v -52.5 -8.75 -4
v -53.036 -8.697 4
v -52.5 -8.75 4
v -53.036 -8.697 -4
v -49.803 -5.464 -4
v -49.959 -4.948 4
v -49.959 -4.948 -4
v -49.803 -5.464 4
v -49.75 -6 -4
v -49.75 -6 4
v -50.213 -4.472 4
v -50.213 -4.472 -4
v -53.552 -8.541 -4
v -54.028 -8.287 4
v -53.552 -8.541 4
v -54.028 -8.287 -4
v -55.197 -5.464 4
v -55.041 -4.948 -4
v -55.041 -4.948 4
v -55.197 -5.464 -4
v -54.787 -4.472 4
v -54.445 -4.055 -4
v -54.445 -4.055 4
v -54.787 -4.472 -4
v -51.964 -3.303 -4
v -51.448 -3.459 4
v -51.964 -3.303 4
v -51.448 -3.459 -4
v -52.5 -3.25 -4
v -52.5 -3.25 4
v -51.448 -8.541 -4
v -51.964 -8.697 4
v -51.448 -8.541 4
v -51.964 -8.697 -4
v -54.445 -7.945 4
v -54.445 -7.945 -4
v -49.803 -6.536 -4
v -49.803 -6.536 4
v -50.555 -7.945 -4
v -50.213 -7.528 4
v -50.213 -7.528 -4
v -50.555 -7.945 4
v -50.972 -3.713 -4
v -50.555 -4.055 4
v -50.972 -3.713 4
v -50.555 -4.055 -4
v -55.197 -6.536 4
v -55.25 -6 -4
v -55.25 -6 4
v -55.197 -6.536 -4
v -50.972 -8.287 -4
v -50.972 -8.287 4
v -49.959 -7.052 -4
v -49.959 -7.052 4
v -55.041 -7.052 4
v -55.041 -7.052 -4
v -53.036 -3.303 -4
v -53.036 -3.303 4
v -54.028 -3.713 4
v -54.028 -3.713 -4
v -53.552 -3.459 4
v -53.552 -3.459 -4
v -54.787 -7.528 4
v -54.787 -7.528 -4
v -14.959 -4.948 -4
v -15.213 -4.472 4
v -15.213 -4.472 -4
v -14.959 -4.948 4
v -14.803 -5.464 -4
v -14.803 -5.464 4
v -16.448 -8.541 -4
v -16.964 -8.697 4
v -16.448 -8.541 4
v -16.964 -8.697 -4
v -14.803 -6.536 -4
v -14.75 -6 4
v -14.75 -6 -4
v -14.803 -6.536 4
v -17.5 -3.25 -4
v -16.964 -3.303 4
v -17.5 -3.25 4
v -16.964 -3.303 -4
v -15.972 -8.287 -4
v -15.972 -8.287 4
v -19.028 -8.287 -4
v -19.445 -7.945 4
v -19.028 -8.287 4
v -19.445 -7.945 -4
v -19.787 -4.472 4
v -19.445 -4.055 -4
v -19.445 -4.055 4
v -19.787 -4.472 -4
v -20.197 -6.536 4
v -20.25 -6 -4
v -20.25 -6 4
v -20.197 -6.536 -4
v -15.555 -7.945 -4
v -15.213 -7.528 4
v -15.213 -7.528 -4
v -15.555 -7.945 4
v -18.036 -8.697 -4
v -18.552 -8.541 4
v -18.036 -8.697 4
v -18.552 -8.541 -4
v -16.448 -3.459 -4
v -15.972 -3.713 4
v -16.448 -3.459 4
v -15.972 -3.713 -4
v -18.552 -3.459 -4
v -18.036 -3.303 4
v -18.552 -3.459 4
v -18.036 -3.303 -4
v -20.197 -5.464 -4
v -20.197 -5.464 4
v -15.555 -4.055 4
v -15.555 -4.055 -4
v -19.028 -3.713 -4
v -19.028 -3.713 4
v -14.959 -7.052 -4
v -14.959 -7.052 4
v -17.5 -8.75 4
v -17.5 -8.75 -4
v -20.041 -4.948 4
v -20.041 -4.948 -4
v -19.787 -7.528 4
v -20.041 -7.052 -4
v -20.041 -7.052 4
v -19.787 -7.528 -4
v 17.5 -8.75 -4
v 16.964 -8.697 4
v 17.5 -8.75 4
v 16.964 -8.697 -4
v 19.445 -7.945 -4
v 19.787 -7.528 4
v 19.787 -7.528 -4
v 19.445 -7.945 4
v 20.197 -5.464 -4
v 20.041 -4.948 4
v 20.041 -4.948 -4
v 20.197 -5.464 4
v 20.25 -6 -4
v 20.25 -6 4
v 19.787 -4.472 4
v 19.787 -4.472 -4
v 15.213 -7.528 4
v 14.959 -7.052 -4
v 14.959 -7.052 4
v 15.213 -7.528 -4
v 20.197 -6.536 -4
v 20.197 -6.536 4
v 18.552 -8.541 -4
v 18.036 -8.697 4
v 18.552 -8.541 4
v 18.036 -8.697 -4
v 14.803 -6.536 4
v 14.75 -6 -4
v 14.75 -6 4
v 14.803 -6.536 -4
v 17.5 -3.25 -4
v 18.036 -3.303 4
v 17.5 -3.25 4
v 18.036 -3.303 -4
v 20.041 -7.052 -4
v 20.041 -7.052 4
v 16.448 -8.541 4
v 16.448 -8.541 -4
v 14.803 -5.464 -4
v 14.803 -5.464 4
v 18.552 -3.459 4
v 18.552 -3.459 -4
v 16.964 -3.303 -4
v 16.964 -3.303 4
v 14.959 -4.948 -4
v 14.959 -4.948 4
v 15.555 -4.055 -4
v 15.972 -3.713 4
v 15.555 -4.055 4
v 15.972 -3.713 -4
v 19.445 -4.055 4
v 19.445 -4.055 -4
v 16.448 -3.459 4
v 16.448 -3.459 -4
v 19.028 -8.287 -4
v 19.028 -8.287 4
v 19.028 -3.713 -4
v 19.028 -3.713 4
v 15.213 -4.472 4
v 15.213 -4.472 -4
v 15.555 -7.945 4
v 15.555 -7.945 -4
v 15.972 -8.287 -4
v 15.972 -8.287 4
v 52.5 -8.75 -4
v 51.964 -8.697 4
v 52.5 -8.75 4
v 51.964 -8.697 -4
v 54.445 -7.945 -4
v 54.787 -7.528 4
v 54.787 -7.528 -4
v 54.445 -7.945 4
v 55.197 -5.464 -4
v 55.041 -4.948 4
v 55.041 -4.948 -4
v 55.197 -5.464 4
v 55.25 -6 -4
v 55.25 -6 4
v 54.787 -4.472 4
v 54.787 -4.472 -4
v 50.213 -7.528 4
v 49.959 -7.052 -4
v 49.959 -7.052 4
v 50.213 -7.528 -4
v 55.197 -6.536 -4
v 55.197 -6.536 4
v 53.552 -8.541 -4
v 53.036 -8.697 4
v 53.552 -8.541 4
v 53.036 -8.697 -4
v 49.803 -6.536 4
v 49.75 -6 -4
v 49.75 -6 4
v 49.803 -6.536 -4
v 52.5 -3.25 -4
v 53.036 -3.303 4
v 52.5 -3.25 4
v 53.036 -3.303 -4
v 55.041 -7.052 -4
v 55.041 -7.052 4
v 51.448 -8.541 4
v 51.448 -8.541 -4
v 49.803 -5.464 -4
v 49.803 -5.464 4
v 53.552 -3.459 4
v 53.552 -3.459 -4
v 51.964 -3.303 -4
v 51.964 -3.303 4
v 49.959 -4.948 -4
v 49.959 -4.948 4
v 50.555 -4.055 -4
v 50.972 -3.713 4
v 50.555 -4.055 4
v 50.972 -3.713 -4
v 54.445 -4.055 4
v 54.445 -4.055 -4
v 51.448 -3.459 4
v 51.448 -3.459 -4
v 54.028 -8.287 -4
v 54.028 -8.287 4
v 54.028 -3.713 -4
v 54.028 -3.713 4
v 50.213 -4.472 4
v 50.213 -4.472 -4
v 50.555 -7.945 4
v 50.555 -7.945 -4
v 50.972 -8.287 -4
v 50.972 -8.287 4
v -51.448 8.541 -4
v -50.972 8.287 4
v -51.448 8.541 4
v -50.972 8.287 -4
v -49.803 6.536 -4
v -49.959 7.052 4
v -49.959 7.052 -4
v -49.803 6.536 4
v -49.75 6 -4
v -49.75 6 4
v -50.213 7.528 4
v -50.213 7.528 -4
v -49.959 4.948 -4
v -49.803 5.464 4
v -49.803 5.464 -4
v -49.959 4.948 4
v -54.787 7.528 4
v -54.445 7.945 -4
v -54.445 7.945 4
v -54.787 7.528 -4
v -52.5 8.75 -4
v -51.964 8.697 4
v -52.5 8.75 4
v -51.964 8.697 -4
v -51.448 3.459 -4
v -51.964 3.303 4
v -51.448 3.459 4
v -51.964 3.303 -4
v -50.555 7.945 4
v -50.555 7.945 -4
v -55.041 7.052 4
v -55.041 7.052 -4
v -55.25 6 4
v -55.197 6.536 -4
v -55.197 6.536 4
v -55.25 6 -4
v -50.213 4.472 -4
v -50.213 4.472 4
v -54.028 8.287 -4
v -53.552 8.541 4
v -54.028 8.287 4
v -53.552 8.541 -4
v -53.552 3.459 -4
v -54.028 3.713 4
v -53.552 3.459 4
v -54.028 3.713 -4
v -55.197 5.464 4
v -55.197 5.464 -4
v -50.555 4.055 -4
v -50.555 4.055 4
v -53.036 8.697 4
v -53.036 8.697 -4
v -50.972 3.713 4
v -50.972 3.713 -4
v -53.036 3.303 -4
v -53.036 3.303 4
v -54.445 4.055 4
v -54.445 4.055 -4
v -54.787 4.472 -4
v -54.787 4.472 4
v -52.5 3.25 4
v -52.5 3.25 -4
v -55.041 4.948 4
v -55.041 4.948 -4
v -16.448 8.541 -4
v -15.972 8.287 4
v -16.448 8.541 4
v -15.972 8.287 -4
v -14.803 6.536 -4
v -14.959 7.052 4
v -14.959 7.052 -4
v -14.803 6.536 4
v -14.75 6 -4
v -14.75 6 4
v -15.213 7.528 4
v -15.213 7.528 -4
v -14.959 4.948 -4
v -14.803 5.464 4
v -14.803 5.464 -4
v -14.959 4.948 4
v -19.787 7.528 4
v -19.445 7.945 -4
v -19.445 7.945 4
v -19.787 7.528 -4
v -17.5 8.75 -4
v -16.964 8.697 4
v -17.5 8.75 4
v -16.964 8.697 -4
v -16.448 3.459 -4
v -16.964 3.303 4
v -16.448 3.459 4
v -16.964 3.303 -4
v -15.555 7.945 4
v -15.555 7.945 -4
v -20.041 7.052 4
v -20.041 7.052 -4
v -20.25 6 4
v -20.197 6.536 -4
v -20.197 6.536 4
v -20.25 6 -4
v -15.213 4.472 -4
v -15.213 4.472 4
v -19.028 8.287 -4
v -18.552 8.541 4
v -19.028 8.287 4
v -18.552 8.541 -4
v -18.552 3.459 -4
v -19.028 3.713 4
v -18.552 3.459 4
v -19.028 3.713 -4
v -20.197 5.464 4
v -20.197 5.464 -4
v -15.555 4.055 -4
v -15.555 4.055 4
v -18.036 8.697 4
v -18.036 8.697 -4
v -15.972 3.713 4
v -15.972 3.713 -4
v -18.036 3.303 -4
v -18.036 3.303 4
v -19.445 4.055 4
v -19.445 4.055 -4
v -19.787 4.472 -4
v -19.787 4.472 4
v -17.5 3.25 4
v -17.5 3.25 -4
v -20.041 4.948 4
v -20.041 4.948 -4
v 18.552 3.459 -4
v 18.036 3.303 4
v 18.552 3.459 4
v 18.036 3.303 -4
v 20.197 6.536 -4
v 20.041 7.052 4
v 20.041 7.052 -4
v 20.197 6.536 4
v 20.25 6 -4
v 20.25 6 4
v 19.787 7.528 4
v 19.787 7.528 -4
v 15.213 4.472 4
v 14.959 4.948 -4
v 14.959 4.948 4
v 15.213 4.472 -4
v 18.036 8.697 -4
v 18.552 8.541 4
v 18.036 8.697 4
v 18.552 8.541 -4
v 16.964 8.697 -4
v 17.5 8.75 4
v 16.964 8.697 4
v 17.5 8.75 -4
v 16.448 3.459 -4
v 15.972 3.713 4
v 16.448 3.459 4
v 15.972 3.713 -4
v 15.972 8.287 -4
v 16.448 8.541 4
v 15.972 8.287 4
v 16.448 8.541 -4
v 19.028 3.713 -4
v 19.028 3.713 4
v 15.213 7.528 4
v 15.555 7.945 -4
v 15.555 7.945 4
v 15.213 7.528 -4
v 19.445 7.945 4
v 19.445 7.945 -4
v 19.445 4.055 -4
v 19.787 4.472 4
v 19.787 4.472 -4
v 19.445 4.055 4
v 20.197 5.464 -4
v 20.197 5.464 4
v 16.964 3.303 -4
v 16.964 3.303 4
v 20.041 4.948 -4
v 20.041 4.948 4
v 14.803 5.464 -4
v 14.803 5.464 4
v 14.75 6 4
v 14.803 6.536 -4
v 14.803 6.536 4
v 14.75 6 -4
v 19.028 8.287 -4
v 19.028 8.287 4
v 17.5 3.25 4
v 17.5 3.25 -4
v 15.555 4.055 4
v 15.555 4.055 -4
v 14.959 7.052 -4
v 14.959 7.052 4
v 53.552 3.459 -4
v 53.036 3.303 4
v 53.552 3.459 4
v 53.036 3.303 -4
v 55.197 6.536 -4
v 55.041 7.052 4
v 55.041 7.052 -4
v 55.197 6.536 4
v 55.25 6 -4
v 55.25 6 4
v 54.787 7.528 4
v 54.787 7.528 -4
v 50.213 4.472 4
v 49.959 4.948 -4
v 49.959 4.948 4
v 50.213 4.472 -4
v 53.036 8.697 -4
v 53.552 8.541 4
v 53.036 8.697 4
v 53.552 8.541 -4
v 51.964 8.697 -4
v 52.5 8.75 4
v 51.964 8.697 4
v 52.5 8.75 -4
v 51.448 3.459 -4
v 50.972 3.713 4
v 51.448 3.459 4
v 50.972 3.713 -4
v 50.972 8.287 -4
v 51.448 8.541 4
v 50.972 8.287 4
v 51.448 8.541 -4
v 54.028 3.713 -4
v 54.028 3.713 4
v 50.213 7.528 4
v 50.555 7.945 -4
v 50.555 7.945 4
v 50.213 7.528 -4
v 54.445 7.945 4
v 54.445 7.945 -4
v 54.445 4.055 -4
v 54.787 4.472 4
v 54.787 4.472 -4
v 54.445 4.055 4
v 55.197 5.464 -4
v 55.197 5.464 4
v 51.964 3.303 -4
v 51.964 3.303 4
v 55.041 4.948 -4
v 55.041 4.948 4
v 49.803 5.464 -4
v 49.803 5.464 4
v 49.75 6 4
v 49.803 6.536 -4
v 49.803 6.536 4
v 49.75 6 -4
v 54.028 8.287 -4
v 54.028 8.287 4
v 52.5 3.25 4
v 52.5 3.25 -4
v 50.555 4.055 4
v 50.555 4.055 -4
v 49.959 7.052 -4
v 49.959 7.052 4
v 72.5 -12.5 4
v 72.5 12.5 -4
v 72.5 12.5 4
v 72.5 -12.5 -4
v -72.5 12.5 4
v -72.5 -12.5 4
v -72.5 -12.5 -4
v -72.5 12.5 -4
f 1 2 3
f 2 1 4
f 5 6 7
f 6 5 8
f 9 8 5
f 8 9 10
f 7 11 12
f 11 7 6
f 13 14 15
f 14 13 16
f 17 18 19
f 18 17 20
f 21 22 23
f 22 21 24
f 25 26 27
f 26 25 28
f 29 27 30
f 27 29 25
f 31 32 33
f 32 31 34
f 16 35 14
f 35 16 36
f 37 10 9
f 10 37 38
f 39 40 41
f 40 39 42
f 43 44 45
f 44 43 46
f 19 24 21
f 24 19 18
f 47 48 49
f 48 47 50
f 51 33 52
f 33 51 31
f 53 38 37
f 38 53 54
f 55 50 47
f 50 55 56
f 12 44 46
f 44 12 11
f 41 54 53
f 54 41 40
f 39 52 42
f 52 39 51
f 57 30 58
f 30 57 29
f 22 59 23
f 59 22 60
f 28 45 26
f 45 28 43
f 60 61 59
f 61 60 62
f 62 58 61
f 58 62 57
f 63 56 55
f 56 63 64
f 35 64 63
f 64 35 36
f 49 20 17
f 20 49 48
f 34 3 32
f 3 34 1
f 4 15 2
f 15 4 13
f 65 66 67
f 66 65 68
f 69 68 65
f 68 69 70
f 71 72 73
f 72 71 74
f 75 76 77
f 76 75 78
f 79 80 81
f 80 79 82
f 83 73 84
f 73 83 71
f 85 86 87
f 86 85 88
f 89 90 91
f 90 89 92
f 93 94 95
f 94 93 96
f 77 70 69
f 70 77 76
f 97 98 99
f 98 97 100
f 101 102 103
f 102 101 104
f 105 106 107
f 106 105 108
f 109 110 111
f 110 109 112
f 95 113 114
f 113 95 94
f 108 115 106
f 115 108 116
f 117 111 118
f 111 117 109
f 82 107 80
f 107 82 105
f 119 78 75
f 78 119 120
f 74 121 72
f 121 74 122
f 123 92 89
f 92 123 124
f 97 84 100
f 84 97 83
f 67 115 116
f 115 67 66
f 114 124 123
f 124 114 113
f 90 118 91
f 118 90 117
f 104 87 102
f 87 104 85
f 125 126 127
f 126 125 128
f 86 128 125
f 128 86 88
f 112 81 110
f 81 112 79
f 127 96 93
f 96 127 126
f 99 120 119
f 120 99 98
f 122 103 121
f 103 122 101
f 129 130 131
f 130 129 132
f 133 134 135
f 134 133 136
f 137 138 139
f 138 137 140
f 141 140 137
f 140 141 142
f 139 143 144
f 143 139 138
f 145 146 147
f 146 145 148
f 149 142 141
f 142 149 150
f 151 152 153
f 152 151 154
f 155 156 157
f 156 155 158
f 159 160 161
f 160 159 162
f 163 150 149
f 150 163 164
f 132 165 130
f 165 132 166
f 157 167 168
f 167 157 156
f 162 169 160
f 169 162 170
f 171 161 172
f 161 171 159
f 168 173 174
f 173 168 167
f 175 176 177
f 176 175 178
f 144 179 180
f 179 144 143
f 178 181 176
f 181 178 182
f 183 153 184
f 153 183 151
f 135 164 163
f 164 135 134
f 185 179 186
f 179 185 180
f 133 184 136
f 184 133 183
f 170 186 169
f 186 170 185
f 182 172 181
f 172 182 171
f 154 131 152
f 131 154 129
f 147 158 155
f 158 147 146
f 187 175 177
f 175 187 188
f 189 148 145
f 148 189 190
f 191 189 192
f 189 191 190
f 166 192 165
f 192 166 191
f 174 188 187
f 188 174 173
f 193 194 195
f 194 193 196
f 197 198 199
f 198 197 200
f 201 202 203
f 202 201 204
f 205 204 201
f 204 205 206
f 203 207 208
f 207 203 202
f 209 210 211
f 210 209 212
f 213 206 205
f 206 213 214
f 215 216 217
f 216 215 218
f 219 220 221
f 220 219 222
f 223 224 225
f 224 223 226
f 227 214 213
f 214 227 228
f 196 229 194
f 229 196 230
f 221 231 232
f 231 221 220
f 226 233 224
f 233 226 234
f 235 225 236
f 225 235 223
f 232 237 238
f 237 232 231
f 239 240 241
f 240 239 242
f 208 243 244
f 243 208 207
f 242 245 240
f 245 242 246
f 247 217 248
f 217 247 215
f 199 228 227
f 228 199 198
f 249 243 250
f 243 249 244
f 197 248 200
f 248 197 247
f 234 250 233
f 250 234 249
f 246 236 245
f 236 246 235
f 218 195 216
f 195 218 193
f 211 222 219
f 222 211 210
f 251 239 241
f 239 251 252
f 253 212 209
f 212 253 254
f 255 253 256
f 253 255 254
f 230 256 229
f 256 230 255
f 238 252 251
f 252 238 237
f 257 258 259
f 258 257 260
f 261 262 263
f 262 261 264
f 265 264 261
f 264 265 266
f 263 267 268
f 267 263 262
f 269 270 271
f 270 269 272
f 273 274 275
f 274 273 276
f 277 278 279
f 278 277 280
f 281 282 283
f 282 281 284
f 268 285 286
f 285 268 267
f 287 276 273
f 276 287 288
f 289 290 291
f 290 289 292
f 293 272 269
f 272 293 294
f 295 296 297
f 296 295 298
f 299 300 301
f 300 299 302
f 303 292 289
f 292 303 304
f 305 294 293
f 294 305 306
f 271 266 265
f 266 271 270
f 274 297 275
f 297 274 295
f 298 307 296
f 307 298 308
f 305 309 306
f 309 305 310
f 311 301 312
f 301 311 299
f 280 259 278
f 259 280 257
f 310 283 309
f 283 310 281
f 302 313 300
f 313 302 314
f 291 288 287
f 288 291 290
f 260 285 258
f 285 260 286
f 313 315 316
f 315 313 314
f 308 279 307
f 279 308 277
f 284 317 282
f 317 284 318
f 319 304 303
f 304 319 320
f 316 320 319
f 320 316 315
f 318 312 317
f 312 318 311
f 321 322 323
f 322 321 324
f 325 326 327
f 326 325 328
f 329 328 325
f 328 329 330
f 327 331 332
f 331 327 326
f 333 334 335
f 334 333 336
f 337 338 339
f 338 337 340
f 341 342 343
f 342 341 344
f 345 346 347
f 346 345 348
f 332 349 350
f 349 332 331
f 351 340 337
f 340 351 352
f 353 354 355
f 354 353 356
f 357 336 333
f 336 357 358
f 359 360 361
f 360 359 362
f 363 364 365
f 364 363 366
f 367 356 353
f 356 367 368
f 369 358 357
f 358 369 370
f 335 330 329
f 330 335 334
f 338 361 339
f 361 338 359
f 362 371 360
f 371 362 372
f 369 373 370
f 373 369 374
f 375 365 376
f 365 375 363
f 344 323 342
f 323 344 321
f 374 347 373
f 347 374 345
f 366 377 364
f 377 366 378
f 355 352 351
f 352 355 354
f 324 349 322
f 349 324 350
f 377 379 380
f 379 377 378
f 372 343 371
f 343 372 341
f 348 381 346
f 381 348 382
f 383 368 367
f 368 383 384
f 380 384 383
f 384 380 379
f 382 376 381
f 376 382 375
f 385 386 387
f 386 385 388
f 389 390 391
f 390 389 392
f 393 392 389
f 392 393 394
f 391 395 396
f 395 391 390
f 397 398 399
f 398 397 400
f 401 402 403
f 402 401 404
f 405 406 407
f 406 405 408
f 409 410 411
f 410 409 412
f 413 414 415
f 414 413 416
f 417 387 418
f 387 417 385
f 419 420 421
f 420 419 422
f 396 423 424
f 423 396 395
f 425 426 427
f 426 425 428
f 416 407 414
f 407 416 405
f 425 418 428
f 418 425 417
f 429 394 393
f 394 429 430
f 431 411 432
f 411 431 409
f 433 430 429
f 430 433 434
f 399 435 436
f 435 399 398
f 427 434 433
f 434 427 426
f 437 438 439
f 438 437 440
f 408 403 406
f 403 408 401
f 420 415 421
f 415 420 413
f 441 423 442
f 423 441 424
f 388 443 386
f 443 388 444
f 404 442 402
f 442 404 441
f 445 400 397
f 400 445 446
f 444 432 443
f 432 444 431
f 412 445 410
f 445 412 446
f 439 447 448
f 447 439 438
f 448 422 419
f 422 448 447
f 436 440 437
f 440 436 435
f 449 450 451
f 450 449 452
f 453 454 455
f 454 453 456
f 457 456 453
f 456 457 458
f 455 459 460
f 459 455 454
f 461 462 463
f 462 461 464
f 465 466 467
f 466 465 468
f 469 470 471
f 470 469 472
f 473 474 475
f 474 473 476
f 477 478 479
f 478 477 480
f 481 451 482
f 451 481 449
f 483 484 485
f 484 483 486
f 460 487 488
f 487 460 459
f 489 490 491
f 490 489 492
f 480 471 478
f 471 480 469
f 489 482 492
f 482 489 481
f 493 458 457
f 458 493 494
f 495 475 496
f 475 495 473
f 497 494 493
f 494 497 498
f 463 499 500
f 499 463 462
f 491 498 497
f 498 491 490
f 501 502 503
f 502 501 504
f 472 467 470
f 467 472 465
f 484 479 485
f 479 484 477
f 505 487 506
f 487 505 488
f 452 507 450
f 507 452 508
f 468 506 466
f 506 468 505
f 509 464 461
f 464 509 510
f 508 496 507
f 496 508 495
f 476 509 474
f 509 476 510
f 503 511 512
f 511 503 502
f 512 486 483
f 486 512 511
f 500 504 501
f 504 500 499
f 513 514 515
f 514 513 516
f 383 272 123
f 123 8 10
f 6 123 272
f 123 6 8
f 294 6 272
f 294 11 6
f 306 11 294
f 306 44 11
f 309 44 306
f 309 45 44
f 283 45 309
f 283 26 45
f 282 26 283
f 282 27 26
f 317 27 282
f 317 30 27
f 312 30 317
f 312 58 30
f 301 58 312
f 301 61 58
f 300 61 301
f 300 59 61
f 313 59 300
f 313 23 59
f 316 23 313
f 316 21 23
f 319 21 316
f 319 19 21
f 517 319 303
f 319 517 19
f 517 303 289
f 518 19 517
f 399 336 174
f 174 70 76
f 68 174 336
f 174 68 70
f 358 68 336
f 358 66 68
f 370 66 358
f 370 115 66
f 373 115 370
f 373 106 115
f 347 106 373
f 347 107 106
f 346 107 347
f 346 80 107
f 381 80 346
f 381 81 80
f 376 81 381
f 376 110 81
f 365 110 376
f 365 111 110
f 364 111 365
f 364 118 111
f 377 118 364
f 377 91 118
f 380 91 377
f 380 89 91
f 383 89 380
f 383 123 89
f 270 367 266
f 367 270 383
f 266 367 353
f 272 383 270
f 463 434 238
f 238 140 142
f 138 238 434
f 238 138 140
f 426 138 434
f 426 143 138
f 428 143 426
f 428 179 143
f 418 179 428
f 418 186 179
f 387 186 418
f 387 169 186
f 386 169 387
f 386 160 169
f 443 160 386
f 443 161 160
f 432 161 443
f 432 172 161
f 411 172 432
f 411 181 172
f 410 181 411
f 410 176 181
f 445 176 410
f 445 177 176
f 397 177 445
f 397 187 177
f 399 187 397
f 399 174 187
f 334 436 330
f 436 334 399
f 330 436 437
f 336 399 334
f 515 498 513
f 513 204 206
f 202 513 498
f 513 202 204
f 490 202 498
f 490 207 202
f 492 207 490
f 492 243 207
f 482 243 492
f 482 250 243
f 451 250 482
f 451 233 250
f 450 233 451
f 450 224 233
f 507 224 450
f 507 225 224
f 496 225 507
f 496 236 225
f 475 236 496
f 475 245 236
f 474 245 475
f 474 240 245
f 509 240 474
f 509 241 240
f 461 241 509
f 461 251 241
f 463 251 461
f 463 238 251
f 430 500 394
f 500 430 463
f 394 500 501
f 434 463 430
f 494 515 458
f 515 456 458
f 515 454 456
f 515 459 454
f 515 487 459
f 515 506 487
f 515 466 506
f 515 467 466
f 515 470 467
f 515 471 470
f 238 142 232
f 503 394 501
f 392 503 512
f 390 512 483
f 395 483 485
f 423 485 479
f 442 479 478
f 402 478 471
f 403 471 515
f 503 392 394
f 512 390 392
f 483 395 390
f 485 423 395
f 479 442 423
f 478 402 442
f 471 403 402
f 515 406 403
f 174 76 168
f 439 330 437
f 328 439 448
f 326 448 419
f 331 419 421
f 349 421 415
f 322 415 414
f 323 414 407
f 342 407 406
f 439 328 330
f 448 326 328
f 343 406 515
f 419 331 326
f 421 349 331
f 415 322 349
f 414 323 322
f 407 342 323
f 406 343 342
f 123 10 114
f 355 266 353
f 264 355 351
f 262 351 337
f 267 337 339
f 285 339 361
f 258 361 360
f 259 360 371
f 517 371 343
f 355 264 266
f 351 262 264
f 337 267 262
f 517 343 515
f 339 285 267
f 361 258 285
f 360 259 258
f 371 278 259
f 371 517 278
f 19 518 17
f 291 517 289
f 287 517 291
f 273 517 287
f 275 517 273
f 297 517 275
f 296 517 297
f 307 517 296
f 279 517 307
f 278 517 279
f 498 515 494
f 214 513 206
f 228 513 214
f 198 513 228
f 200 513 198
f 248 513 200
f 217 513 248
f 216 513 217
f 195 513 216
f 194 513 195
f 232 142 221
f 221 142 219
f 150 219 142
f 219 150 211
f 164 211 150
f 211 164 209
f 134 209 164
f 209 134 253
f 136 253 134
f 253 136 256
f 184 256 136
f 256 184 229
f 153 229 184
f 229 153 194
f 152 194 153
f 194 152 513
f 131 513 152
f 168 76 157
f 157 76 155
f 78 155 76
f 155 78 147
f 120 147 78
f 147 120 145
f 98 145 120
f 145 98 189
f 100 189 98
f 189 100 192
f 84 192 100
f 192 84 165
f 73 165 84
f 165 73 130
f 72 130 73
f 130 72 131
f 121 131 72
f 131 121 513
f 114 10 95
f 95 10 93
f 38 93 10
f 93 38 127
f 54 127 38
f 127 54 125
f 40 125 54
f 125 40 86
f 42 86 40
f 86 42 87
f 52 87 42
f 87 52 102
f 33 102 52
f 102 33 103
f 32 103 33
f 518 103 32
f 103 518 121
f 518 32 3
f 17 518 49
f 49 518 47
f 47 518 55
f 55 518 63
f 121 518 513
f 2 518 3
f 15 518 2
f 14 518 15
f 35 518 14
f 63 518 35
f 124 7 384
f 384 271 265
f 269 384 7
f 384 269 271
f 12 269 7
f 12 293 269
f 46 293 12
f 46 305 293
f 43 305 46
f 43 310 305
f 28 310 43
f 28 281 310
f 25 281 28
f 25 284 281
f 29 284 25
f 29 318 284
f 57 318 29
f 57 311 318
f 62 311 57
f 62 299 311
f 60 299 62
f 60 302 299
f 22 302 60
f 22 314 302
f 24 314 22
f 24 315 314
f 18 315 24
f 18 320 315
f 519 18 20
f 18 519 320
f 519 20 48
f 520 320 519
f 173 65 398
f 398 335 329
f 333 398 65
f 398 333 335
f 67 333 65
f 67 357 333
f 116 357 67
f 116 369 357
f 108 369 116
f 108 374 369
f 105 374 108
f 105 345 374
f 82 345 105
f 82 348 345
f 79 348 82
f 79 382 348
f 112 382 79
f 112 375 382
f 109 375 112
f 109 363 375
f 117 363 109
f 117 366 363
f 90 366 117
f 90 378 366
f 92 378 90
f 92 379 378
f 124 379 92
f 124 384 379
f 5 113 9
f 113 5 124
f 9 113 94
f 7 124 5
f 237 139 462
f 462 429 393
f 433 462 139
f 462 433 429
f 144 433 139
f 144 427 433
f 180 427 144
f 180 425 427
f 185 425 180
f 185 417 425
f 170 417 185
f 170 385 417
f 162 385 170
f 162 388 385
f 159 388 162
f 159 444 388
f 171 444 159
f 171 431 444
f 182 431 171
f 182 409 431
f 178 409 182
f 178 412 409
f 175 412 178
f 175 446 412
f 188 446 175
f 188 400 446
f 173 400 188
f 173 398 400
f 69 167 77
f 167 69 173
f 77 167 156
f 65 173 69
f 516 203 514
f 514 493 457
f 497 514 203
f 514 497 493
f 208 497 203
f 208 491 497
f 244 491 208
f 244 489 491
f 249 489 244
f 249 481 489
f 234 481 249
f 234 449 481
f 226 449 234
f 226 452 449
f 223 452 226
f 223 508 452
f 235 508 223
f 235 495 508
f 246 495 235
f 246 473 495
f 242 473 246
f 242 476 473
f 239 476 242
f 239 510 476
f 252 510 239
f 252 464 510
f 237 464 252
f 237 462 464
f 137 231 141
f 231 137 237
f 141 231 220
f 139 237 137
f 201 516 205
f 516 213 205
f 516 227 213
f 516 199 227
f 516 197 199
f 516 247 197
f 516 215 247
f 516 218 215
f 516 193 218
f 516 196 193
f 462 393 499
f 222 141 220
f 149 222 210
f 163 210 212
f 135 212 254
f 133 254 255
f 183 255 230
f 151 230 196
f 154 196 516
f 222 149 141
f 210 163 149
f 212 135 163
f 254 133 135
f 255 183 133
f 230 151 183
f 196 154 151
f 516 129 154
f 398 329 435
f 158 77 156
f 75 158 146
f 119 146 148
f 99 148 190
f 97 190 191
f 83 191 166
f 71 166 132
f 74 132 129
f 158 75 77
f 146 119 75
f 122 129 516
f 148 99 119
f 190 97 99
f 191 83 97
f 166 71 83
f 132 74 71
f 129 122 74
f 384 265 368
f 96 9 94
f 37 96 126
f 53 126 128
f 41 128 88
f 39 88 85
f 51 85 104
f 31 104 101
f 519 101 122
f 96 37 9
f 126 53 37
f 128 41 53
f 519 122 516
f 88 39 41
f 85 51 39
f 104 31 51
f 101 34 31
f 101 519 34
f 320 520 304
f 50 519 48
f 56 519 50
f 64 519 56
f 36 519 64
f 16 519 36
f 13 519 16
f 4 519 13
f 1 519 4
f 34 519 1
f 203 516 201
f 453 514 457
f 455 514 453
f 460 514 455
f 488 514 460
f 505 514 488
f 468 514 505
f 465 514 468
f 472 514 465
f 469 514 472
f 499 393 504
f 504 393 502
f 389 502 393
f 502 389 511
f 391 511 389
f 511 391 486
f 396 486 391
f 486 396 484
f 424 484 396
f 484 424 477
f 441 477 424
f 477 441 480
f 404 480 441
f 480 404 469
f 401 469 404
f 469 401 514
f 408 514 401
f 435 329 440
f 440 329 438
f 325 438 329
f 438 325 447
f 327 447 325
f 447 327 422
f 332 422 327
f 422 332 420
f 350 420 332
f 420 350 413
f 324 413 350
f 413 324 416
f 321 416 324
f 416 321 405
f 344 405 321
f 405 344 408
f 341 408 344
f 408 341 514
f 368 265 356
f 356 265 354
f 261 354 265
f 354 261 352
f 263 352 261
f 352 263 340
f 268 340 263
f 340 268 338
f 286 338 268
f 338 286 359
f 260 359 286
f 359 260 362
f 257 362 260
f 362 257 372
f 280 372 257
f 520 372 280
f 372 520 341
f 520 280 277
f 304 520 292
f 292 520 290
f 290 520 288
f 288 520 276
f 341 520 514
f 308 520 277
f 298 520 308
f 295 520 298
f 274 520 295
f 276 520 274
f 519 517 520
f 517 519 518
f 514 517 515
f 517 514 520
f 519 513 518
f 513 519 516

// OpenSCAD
$fn = 32;

// ----------------------------------------------------------------------
// Hole bar, 4 x Ø5.5
// tworows layout, 20 mm edge offset
// ----------------------------------------------------------------------

// --- parameters (mm) ---
bar_w = 25;       // bar width (Y)
bar_t = 8;        // bar thickness (Z)
holes = 4;        // holes per row
hole_d = 5.5;     // hole diameter
edge = 20;        // offset from the bar end to the first hole
pitch = 35;       // pitch between neighbouring holes
row_offset = 12;  // distance between the two rows

// --- derived feature positions (mm) ---
span = (holes - 1) * pitch;   // = 105   distance between the end holes
bar_l = span + 2 * edge;      // = 145   overall bar length
start_x = -bar_l / 2 + edge;  // = -52.5   X of the first hole
feature_centers = [
  [start_x + 0 * pitch, -row_offset / 2],
  [start_x + 1 * pitch, -row_offset / 2],
  [start_x + 2 * pitch, -row_offset / 2],
  [start_x + 3 * pitch, -row_offset / 2]
];   // hole centres of the first row
row2_centers = [
  [start_x + 0 * pitch, row_offset / 2],
  [start_x + 1 * pitch, row_offset / 2],
  [start_x + 2 * pitch, row_offset / 2],
  [start_x + 3 * pitch, row_offset / 2]
];   // hole centres of the second row

// bar with two rows of holes, both read from their own centre arrays
difference() {
  translate([-bar_l / 2, -bar_w / 2, -bar_t / 2]) cube([bar_l, bar_w, bar_t]);
  for (centre = feature_centers)
    translate([centre[0], centre[1], 0])
      cylinder(d = hole_d, h = bar_t + 2, center = true);
  for (centre = row2_centers)
    translate([centre[0], centre[1], 0])
      cylinder(d = hole_d, h = bar_t + 2, center = true);
}
